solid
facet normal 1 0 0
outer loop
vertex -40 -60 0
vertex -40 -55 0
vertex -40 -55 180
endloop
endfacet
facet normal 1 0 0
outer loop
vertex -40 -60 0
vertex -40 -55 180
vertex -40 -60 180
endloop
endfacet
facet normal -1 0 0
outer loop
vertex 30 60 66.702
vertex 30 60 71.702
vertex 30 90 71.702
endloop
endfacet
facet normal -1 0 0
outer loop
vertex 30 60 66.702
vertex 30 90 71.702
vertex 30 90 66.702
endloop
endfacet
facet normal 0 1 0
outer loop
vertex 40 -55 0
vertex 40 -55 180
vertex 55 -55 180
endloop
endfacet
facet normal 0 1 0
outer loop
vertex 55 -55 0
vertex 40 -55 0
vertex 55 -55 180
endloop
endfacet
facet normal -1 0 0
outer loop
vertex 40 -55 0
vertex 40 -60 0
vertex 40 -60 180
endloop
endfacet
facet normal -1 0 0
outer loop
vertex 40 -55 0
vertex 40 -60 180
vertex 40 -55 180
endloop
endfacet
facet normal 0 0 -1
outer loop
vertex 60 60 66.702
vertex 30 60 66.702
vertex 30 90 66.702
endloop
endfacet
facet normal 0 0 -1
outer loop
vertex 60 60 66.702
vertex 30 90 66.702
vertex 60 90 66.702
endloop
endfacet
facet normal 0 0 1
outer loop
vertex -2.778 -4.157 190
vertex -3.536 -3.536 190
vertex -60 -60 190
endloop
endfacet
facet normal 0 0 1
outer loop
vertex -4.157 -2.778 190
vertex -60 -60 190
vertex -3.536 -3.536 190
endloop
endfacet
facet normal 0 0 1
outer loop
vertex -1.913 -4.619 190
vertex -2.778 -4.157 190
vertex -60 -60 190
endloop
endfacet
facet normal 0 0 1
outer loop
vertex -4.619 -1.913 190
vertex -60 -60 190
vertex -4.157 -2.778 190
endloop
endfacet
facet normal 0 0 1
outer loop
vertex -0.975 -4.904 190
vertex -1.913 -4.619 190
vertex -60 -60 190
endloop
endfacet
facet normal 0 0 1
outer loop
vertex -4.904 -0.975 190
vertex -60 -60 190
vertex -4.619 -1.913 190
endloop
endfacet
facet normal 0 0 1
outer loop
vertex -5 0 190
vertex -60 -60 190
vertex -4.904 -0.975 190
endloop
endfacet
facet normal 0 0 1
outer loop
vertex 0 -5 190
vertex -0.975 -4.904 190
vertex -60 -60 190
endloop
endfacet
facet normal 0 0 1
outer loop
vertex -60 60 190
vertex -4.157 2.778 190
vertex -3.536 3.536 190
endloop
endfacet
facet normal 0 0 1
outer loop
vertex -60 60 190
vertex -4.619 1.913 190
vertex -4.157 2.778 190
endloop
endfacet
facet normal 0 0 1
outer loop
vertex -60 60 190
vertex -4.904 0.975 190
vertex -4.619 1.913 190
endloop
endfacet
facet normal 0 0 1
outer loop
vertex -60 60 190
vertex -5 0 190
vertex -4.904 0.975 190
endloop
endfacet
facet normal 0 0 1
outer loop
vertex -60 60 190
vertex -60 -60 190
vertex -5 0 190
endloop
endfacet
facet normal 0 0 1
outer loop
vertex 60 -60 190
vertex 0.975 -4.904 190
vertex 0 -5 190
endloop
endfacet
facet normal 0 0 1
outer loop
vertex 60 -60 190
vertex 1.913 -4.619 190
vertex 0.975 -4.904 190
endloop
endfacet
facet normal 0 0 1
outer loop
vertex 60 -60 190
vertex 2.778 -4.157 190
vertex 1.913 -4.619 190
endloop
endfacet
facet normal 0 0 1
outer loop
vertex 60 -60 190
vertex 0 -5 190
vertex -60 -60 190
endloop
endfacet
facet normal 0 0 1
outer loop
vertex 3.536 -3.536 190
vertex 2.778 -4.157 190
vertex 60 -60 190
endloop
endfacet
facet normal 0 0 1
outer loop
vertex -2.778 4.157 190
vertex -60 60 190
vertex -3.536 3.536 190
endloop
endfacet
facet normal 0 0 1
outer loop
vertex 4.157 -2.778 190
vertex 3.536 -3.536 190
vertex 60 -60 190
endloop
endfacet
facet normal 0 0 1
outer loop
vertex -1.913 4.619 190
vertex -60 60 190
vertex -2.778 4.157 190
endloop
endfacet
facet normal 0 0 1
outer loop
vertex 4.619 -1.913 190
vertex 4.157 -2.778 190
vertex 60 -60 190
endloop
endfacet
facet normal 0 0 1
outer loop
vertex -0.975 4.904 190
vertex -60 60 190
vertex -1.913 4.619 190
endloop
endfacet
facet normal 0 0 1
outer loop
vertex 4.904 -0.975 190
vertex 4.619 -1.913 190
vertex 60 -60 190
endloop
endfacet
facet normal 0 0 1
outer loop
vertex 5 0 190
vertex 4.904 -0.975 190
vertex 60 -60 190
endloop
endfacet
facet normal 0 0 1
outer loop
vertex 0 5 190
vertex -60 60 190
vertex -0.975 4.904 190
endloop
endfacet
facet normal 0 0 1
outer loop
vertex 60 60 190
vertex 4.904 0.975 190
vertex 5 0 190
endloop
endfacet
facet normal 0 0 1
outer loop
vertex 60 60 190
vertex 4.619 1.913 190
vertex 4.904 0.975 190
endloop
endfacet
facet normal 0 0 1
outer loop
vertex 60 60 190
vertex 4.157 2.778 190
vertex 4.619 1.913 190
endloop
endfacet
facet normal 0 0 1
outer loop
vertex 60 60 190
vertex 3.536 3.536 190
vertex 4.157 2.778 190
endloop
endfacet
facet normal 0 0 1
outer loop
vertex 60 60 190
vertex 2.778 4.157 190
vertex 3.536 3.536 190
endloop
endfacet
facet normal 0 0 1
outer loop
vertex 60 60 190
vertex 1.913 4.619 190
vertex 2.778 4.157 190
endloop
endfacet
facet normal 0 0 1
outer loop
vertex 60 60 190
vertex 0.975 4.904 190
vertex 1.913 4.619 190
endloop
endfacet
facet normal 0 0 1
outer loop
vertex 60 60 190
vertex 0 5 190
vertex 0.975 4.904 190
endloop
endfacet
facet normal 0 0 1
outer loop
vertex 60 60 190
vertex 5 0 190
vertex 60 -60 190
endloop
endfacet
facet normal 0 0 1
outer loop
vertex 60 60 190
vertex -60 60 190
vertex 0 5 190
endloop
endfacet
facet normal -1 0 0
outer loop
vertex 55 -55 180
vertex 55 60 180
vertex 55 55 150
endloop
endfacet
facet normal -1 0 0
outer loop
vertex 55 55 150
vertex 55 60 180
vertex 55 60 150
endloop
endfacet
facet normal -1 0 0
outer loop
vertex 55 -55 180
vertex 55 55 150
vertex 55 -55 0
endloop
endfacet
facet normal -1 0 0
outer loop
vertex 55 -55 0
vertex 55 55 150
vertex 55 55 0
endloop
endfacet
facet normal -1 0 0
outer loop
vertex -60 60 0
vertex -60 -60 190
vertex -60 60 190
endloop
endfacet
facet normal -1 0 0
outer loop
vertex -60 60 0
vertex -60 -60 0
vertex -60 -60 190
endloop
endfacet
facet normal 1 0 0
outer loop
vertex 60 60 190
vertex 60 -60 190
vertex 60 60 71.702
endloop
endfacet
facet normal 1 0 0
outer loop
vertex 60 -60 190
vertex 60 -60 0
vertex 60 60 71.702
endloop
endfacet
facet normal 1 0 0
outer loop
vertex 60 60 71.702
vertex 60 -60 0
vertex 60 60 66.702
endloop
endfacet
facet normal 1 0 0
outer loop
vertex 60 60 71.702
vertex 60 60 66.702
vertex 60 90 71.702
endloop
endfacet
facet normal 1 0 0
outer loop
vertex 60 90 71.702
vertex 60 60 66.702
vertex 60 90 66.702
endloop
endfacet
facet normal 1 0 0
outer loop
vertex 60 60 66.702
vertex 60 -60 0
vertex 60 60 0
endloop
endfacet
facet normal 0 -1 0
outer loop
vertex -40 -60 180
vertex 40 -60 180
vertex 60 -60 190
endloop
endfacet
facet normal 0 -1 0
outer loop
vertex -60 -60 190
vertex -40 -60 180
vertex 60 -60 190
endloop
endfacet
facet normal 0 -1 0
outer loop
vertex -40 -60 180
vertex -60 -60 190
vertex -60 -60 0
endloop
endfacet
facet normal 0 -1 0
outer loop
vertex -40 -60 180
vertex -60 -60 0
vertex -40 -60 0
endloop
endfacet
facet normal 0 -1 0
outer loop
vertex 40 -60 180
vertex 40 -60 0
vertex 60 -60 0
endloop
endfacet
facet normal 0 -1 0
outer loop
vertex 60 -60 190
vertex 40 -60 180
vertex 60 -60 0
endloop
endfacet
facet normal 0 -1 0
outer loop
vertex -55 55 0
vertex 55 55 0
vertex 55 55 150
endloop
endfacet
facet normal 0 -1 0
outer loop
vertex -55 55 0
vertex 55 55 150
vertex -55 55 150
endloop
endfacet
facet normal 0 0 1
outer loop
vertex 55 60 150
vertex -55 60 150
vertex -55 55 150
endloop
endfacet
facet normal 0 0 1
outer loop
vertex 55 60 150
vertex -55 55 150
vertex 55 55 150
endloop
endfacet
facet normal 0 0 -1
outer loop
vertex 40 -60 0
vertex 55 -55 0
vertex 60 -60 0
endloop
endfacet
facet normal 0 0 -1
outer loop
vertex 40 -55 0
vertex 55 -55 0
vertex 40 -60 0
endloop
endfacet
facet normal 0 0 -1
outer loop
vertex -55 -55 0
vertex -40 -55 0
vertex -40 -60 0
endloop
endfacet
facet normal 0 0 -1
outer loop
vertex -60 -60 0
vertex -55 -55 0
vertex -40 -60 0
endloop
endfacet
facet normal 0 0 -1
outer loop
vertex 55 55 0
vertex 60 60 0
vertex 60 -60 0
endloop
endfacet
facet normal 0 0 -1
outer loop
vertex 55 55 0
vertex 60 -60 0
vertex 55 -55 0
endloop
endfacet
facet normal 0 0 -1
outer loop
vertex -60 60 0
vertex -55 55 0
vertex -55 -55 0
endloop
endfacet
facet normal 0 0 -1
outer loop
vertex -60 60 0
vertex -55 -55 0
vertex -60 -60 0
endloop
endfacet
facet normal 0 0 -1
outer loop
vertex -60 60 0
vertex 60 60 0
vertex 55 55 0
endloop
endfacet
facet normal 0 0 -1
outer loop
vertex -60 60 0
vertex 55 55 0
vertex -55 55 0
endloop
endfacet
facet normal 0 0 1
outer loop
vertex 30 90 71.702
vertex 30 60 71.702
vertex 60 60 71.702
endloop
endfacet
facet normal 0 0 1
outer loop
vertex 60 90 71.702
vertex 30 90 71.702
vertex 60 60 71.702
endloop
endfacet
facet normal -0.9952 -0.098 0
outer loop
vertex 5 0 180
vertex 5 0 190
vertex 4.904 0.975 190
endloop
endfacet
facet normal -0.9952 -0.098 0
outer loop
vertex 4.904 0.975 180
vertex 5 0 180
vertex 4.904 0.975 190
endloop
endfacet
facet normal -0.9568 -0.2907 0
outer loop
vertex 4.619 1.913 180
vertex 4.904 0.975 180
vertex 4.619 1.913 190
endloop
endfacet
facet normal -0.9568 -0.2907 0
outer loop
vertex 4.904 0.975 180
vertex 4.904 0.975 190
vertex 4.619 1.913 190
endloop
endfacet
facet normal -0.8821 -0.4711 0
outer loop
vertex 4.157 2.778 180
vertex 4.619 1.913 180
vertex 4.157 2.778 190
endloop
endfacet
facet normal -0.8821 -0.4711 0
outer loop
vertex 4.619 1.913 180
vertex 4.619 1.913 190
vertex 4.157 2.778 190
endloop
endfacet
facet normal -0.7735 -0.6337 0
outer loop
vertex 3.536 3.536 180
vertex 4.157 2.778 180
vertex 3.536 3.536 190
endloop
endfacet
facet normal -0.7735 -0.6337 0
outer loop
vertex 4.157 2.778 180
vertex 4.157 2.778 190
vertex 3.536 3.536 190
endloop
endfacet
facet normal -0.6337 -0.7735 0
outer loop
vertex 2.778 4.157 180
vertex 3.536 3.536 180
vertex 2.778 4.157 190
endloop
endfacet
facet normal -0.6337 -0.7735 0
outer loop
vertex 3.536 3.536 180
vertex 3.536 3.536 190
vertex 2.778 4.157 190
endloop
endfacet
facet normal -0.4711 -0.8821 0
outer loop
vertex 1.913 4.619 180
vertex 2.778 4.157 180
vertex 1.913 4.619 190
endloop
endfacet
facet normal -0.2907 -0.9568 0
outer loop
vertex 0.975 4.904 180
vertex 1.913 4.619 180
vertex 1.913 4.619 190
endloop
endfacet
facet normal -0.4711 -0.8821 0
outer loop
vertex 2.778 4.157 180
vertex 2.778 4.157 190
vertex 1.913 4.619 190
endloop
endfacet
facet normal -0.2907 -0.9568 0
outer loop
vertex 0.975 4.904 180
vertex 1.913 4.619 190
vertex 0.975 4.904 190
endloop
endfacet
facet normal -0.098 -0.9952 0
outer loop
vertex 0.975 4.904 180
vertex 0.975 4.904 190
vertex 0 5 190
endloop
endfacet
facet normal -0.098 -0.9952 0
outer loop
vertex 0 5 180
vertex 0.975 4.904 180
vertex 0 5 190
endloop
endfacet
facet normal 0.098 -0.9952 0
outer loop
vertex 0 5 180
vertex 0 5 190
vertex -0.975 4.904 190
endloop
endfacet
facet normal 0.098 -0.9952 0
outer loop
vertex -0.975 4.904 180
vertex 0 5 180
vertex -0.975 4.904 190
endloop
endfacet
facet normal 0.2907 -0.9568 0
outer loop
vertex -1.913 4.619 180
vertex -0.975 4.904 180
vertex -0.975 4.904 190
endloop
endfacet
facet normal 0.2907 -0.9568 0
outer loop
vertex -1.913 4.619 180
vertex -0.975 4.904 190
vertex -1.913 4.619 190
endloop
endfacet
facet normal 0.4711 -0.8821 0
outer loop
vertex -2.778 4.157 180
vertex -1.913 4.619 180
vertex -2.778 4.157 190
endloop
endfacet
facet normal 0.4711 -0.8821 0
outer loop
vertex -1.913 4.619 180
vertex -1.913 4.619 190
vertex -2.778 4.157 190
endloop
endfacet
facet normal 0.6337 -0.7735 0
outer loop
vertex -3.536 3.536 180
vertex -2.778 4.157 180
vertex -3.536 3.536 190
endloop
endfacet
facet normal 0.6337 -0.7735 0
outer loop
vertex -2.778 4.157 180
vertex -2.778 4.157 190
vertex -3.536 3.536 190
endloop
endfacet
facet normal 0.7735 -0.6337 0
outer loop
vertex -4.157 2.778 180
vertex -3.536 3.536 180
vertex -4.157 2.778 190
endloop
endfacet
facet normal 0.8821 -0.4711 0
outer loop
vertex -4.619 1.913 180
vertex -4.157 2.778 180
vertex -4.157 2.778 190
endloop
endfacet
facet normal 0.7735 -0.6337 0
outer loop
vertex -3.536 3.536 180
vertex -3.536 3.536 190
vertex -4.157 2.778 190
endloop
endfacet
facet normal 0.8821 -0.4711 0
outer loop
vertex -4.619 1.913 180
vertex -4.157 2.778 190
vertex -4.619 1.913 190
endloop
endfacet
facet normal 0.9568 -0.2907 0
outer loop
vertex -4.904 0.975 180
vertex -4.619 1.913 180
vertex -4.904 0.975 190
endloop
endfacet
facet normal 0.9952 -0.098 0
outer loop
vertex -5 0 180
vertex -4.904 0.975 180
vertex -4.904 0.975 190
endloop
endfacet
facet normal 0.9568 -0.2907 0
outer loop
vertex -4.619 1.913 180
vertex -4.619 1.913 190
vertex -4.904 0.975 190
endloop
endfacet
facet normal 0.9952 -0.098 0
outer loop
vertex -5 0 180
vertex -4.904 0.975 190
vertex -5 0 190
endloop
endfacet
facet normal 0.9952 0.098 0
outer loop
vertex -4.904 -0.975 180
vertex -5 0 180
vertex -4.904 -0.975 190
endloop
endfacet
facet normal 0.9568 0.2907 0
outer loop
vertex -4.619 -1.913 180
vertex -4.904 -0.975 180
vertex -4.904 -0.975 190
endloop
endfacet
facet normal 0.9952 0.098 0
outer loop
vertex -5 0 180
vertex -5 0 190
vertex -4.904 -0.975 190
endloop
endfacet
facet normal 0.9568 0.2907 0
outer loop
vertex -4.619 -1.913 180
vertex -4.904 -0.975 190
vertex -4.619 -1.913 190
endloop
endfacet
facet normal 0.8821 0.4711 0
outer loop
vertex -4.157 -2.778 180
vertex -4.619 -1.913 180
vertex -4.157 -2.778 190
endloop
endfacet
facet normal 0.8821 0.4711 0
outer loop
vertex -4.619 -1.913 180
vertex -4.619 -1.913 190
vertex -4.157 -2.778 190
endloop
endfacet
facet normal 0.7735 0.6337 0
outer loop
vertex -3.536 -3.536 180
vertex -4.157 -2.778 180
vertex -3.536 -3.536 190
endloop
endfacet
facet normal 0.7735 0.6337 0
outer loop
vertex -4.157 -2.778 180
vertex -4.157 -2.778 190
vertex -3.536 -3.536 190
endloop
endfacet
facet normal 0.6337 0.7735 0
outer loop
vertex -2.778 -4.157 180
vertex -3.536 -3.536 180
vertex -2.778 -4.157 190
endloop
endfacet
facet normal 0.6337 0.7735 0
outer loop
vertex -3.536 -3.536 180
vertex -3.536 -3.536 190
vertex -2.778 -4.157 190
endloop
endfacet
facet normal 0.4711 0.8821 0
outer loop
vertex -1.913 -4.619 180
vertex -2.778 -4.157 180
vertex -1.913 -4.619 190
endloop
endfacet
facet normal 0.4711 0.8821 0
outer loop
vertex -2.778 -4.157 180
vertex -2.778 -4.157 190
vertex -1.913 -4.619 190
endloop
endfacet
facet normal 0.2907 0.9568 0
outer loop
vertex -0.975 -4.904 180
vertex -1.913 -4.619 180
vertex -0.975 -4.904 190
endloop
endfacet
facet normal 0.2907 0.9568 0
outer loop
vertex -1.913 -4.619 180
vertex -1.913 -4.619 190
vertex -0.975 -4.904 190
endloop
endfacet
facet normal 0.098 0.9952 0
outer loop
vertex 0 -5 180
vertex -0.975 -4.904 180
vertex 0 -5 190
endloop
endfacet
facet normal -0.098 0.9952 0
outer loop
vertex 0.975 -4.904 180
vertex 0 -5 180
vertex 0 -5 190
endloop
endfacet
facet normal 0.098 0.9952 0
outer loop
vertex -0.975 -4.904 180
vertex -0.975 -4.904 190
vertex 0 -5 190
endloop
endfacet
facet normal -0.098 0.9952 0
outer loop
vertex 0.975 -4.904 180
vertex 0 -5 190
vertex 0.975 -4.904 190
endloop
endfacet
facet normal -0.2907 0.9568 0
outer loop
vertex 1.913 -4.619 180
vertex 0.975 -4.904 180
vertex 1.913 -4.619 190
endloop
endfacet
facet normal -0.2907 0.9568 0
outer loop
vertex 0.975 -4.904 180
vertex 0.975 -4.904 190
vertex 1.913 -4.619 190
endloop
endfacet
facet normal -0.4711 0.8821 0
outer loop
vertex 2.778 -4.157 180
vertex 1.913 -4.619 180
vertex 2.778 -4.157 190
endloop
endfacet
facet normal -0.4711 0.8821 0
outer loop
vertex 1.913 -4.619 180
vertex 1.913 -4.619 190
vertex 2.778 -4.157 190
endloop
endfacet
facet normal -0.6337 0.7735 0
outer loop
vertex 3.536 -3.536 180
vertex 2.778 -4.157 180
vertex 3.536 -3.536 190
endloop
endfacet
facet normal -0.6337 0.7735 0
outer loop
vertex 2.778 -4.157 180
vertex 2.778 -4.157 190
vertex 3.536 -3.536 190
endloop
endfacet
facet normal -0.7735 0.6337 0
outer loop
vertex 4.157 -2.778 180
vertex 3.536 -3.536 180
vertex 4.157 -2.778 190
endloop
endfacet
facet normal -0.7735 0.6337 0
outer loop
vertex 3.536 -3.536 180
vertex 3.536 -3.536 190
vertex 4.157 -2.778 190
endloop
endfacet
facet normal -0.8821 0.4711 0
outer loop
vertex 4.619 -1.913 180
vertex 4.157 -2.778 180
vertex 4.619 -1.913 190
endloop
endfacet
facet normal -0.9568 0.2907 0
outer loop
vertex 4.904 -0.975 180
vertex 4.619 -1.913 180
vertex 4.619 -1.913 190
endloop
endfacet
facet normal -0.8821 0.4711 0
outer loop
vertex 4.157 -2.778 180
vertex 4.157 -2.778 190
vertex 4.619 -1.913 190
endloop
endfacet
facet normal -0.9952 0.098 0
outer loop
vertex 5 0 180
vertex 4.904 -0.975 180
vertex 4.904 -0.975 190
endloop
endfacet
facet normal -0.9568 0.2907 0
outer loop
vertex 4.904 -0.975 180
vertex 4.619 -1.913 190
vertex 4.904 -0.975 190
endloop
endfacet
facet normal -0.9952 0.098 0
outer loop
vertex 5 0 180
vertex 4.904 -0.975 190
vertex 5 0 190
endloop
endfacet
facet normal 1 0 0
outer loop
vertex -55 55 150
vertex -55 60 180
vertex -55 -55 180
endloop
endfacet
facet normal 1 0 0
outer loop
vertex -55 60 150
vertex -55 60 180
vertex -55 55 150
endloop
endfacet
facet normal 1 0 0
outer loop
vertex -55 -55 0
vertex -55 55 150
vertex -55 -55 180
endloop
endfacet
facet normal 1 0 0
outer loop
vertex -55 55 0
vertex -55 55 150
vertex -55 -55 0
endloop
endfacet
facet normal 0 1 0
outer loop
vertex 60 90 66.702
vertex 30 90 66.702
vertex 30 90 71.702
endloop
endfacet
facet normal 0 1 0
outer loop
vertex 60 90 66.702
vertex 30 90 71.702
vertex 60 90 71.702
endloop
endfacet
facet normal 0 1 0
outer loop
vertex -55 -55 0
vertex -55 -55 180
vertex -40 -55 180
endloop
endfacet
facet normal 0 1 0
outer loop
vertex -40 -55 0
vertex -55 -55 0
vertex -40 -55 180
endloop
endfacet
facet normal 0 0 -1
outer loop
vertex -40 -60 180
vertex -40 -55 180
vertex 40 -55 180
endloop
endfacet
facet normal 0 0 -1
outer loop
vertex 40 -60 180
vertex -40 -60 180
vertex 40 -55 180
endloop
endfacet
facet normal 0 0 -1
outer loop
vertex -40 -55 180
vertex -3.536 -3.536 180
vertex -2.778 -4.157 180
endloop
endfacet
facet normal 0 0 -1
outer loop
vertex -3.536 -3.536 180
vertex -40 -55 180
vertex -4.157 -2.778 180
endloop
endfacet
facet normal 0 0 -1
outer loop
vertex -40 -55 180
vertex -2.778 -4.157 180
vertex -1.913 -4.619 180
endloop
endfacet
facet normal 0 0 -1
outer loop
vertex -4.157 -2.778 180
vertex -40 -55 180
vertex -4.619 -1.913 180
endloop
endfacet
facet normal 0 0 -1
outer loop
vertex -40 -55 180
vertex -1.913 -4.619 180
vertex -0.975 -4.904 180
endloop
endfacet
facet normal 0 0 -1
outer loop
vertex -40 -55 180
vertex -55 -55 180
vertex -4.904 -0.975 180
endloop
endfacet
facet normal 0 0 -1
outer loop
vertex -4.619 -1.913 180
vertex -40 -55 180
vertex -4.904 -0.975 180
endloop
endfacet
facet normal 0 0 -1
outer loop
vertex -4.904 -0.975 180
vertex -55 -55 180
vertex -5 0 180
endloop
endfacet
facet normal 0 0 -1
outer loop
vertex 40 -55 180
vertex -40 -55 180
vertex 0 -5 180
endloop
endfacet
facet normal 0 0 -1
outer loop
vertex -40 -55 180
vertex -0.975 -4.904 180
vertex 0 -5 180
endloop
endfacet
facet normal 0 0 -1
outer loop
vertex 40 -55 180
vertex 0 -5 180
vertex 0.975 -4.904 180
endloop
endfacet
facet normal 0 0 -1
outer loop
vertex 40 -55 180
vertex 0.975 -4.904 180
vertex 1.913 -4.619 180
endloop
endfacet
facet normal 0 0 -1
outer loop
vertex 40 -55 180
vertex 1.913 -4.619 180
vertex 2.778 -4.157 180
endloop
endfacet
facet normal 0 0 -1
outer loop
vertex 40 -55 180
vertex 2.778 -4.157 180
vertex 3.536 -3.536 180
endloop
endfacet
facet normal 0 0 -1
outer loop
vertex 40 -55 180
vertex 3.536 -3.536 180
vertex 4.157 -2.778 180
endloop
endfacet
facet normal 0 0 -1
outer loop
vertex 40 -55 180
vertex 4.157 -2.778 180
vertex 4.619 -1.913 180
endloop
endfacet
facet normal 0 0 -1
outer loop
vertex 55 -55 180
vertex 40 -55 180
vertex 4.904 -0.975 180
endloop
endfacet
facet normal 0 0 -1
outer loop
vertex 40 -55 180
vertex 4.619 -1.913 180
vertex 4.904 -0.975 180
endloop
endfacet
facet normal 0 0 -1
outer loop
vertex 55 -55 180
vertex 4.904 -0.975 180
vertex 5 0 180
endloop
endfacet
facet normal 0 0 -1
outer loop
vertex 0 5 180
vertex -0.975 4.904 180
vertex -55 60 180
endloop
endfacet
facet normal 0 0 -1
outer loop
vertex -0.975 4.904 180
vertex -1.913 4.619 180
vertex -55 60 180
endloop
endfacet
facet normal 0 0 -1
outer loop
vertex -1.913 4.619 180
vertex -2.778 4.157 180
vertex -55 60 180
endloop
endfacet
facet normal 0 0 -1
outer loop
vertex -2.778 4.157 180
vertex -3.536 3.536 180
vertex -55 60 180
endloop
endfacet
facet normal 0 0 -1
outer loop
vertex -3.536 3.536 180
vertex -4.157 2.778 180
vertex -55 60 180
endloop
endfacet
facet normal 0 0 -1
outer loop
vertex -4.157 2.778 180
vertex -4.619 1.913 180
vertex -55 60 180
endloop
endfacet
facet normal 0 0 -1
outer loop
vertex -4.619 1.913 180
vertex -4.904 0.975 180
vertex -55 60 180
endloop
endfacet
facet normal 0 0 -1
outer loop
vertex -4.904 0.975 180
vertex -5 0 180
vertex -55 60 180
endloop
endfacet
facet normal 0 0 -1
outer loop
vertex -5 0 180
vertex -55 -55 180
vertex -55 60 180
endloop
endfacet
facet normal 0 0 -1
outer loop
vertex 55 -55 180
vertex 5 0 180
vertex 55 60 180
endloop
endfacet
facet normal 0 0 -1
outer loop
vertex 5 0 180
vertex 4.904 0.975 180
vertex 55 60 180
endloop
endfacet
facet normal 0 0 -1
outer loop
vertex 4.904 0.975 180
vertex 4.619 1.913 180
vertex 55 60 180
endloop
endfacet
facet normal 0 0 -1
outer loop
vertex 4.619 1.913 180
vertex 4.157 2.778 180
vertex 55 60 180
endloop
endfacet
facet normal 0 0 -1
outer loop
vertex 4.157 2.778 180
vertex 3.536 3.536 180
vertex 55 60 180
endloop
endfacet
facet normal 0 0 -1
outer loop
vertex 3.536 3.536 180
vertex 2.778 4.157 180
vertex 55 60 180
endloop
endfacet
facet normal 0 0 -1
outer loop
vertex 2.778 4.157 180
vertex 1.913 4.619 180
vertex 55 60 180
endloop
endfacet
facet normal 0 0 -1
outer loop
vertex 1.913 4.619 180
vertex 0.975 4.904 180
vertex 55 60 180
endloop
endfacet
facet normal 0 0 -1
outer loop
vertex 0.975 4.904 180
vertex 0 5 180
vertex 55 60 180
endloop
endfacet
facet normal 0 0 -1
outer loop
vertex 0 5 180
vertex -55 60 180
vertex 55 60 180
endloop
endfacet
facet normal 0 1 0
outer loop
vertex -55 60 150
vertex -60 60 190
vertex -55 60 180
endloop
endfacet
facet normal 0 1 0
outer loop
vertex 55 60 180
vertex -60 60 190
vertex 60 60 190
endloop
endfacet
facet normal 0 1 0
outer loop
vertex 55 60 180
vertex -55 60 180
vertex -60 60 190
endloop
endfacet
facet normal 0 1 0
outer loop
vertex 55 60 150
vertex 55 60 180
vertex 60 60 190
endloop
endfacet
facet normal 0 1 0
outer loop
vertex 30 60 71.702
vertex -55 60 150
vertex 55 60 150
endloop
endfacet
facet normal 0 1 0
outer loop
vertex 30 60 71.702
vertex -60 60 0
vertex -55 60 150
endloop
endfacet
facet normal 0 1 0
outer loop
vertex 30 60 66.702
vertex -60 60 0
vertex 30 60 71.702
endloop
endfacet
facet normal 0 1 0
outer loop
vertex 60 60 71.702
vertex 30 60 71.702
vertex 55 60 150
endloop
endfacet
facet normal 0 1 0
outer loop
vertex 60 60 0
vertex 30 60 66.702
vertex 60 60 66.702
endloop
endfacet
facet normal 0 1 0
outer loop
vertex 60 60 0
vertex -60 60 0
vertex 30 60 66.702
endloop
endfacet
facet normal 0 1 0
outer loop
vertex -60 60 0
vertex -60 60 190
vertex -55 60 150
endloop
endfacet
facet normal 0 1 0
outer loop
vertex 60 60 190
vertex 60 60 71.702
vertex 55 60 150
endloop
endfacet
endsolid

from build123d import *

# Parameters (mm, degrees)
BOSS_EXTRUDE1_DEPTH = 180
SKETCH2_W           = 120
SKETCH2_H           = 120
BOSS_EXTRUDE2_DEPTH = 10
SKETCH3_R           = 5
CUT_EXTRUDE1_DEPTH  = 10
SKETCH4_W           = 110
SKETCH4_H           = 30
CUT_EXTRUDE2_DEPTH  = 10
SKETCH5_W           = 30
SKETCH5_H           = 5
BOSS_EXTRUDE3_DEPTH = 30


with BuildPart() as part:
    # Sketch1 → Boss-Extrude1 (new body)
    with BuildSketch(Plane.XY):
        Polygon((-60, 60), (60, 60), (60, -60), (40, -60), (40, -55), (55, -55), (55, 55), (-55, 55), (-55, -55), (-40, -55), (-40, -60), (-60, -60), align=None)
    extrude(amount=BOSS_EXTRUDE1_DEPTH)

    # Sketch2 → Boss-Extrude2 (add)
    with BuildSketch(Plane.XY.offset(180)):
        Rectangle(SKETCH2_W, SKETCH2_H)
    extrude(amount=BOSS_EXTRUDE2_DEPTH)

    # Sketch3 → Cut-Extrude1 (cut)
    with BuildSketch(Plane.XY.offset(190)):
        Circle(SKETCH3_R)
    extrude(amount=-CUT_EXTRUDE1_DEPTH, mode=Mode.SUBTRACT)

    # Sketch4 → Cut-Extrude2 (cut)
    with BuildSketch(Plane(origin=(0, 60, 0), x_dir=(1, 0, 0), z_dir=(0, 1, 0))):
        with Locations((0, -165)):
            Rectangle(SKETCH4_W, SKETCH4_H)
    extrude(amount=-CUT_EXTRUDE2_DEPTH, mode=Mode.SUBTRACT)

    # Sketch5 → Boss-Extrude3 (add)
    with BuildSketch(Plane(origin=(0, 60, 0), x_dir=(1, 0, 0), z_dir=(0, 1, 0))):
        with Locations((45, -69.201770824)):
            Rectangle(SKETCH5_W, SKETCH5_H)
    extrude(amount=BOSS_EXTRUDE3_DEPTH)


solid = part.part
